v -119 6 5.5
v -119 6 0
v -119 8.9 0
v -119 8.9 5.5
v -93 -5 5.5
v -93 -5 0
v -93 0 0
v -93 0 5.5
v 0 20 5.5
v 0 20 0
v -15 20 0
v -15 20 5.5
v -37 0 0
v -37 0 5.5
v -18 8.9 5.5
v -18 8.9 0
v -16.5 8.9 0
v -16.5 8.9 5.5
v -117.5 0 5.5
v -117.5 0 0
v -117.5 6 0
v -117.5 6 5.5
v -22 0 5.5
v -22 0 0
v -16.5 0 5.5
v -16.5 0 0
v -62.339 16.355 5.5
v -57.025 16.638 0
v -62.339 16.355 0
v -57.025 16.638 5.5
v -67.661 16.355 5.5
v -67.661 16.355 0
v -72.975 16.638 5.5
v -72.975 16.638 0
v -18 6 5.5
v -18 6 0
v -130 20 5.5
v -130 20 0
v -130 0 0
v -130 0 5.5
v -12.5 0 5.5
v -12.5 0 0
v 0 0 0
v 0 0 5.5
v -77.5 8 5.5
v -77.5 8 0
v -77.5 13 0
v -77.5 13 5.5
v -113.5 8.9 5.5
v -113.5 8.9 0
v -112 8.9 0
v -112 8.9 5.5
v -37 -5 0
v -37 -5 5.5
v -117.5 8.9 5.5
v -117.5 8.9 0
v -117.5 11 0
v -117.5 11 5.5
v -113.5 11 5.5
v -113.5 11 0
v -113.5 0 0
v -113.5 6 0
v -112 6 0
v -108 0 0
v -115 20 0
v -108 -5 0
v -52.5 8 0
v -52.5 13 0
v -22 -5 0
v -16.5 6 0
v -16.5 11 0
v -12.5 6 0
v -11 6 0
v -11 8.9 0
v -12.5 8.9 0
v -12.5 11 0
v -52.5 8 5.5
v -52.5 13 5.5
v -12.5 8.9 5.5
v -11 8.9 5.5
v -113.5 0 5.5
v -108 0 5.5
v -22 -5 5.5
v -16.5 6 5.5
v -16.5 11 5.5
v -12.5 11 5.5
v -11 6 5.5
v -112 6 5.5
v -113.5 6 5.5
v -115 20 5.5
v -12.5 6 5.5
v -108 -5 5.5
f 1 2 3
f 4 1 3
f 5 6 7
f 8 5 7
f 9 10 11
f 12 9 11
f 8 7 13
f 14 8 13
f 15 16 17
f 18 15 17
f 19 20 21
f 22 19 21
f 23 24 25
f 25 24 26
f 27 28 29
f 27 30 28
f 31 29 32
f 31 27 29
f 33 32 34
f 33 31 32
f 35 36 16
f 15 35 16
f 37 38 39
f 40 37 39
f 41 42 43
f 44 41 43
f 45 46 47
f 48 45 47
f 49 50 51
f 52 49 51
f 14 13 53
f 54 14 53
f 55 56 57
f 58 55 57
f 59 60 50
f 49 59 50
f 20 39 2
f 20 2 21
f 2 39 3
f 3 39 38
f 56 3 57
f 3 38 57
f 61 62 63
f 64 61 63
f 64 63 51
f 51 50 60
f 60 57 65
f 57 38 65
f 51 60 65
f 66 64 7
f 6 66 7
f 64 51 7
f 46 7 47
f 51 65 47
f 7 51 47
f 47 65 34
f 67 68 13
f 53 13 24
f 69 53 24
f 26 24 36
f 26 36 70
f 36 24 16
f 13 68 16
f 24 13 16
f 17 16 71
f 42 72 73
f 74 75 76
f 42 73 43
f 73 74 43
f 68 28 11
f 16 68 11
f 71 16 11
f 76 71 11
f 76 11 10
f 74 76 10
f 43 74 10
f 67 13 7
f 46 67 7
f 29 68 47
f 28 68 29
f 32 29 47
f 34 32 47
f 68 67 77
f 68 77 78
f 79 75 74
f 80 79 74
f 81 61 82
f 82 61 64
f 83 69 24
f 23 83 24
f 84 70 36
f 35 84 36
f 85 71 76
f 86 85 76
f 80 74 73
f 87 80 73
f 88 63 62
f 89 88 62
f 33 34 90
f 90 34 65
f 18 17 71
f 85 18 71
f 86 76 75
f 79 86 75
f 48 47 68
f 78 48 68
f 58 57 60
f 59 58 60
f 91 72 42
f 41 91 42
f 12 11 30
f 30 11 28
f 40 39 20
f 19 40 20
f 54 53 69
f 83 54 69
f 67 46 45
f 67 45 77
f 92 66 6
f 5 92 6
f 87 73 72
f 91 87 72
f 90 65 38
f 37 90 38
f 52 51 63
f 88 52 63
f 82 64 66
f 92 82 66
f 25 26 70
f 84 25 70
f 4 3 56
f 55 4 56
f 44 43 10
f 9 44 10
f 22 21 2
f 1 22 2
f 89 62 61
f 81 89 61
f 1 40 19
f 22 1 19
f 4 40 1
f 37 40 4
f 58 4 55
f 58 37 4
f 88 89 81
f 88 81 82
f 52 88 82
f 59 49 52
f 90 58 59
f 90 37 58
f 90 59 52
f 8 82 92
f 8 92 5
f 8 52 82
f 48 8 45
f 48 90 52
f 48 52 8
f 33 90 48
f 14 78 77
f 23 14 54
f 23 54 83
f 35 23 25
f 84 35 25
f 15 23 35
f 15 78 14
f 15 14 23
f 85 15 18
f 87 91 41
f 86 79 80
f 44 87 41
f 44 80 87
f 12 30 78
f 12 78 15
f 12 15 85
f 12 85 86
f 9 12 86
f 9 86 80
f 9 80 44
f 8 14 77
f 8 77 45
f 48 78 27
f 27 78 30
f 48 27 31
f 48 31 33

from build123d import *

# Parameters (mm, degrees)
SKETCH_1_W      = 25
SKETCH_1_H      = 5
EXTRUDE_1_DEPTH = 5.5
FILLET_1_R      = 100


with BuildPart() as part:
    # 草图1 → 凸台-拉伸1 (new body)
    with BuildSketch(Plane.XY):
        Polygon((-15, 20), (-65, 16), (-115, 20), (-130, 20), (-130, 0), (-117.5, 0), (-117.5, 6), (-119, 6), (-119, 8.9), (-117.5, 8.9), (-117.5, 11), (-113.5, 11), (-113.5, 8.9), (-112, 8.9), (-112, 6), (-113.5, 6), (-113.5, 0), (-108, 0), (-108, -5), (-93, -5), (-93, 0), (-37, 0), (-37, -5), (-22, -5), (-22, 0), (-16.5, 0), (-16.5, 6), (-18, 6), (-18, 8.9), (-16.5, 8.9), (-16.5, 11), (-12.5, 11), (-12.5, 8.9), (-11, 8.9), (-11, 6), (-12.5, 6), (-12.5, 0), (0, 0), (0, 20), align=None)
        with Locations((-65, 10.5)):
            Rectangle(SKETCH_1_W, SKETCH_1_H, mode=Mode.SUBTRACT)
    extrude(amount=EXTRUDE_1_DEPTH)

    # 圆角1
    fillet_1_edges = [part.edges().sort_by_distance(p)[0] for p in [
        (-65, 16, 2.75),
    ]]
    fillet(fillet_1_edges, radius=FILLET_1_R)


solid = part.part
